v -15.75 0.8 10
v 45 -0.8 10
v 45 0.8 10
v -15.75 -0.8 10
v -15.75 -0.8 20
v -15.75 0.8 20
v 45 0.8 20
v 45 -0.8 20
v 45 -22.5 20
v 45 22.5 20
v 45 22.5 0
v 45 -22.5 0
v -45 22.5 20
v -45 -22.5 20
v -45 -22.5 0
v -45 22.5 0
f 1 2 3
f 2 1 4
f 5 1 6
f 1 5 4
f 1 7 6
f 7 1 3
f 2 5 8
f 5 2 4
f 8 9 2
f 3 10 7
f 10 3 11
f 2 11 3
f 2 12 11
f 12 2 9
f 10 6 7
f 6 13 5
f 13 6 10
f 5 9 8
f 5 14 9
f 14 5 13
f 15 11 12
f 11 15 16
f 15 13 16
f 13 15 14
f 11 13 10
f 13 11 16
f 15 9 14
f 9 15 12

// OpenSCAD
// Microscope slide drying rack
// Print orientation: base on bed (z = 0), slots open upward (+Z)

// ---------------- Parameters ----------------
block_len     = 90;    // base block length along X (mm)
block_wid     = 45;    // base block width along Y (mm)
block_h       = 20;    // base block height along Z (mm)

slot_count    = 10;    // number of slide slots
slot_len      = 77;    // slot length along X (mm)
slot_w        = 1.6;   // slot width along Y (mm)
slot_depth    = 10;    // slot depth from top face (mm)
slot_pitch    = 3.5;   // centre-to-centre slot spacing along Y (mm)

eps           = 0.5;   // overshoot of cutters past faces (mm)

$fn = 64;

// ---------------- Model ----------------
difference() {
    // Base block, centred in X and Y, resting on z = 0
    translate([-block_len/2, -block_wid/2, 0])
        cube([block_len, block_wid, block_h]);

    // Parallel slots running along X, centred as a group in X and Y
    for (i = [0 : slot_count - 1]) {
        translate([(i - (slot_count - 1)/2) * slot_pitch, -slot_w/2,
                   block_h - slot_depth])
            cube([slot_len, slot_w, slot_depth + eps]);
    }
}
